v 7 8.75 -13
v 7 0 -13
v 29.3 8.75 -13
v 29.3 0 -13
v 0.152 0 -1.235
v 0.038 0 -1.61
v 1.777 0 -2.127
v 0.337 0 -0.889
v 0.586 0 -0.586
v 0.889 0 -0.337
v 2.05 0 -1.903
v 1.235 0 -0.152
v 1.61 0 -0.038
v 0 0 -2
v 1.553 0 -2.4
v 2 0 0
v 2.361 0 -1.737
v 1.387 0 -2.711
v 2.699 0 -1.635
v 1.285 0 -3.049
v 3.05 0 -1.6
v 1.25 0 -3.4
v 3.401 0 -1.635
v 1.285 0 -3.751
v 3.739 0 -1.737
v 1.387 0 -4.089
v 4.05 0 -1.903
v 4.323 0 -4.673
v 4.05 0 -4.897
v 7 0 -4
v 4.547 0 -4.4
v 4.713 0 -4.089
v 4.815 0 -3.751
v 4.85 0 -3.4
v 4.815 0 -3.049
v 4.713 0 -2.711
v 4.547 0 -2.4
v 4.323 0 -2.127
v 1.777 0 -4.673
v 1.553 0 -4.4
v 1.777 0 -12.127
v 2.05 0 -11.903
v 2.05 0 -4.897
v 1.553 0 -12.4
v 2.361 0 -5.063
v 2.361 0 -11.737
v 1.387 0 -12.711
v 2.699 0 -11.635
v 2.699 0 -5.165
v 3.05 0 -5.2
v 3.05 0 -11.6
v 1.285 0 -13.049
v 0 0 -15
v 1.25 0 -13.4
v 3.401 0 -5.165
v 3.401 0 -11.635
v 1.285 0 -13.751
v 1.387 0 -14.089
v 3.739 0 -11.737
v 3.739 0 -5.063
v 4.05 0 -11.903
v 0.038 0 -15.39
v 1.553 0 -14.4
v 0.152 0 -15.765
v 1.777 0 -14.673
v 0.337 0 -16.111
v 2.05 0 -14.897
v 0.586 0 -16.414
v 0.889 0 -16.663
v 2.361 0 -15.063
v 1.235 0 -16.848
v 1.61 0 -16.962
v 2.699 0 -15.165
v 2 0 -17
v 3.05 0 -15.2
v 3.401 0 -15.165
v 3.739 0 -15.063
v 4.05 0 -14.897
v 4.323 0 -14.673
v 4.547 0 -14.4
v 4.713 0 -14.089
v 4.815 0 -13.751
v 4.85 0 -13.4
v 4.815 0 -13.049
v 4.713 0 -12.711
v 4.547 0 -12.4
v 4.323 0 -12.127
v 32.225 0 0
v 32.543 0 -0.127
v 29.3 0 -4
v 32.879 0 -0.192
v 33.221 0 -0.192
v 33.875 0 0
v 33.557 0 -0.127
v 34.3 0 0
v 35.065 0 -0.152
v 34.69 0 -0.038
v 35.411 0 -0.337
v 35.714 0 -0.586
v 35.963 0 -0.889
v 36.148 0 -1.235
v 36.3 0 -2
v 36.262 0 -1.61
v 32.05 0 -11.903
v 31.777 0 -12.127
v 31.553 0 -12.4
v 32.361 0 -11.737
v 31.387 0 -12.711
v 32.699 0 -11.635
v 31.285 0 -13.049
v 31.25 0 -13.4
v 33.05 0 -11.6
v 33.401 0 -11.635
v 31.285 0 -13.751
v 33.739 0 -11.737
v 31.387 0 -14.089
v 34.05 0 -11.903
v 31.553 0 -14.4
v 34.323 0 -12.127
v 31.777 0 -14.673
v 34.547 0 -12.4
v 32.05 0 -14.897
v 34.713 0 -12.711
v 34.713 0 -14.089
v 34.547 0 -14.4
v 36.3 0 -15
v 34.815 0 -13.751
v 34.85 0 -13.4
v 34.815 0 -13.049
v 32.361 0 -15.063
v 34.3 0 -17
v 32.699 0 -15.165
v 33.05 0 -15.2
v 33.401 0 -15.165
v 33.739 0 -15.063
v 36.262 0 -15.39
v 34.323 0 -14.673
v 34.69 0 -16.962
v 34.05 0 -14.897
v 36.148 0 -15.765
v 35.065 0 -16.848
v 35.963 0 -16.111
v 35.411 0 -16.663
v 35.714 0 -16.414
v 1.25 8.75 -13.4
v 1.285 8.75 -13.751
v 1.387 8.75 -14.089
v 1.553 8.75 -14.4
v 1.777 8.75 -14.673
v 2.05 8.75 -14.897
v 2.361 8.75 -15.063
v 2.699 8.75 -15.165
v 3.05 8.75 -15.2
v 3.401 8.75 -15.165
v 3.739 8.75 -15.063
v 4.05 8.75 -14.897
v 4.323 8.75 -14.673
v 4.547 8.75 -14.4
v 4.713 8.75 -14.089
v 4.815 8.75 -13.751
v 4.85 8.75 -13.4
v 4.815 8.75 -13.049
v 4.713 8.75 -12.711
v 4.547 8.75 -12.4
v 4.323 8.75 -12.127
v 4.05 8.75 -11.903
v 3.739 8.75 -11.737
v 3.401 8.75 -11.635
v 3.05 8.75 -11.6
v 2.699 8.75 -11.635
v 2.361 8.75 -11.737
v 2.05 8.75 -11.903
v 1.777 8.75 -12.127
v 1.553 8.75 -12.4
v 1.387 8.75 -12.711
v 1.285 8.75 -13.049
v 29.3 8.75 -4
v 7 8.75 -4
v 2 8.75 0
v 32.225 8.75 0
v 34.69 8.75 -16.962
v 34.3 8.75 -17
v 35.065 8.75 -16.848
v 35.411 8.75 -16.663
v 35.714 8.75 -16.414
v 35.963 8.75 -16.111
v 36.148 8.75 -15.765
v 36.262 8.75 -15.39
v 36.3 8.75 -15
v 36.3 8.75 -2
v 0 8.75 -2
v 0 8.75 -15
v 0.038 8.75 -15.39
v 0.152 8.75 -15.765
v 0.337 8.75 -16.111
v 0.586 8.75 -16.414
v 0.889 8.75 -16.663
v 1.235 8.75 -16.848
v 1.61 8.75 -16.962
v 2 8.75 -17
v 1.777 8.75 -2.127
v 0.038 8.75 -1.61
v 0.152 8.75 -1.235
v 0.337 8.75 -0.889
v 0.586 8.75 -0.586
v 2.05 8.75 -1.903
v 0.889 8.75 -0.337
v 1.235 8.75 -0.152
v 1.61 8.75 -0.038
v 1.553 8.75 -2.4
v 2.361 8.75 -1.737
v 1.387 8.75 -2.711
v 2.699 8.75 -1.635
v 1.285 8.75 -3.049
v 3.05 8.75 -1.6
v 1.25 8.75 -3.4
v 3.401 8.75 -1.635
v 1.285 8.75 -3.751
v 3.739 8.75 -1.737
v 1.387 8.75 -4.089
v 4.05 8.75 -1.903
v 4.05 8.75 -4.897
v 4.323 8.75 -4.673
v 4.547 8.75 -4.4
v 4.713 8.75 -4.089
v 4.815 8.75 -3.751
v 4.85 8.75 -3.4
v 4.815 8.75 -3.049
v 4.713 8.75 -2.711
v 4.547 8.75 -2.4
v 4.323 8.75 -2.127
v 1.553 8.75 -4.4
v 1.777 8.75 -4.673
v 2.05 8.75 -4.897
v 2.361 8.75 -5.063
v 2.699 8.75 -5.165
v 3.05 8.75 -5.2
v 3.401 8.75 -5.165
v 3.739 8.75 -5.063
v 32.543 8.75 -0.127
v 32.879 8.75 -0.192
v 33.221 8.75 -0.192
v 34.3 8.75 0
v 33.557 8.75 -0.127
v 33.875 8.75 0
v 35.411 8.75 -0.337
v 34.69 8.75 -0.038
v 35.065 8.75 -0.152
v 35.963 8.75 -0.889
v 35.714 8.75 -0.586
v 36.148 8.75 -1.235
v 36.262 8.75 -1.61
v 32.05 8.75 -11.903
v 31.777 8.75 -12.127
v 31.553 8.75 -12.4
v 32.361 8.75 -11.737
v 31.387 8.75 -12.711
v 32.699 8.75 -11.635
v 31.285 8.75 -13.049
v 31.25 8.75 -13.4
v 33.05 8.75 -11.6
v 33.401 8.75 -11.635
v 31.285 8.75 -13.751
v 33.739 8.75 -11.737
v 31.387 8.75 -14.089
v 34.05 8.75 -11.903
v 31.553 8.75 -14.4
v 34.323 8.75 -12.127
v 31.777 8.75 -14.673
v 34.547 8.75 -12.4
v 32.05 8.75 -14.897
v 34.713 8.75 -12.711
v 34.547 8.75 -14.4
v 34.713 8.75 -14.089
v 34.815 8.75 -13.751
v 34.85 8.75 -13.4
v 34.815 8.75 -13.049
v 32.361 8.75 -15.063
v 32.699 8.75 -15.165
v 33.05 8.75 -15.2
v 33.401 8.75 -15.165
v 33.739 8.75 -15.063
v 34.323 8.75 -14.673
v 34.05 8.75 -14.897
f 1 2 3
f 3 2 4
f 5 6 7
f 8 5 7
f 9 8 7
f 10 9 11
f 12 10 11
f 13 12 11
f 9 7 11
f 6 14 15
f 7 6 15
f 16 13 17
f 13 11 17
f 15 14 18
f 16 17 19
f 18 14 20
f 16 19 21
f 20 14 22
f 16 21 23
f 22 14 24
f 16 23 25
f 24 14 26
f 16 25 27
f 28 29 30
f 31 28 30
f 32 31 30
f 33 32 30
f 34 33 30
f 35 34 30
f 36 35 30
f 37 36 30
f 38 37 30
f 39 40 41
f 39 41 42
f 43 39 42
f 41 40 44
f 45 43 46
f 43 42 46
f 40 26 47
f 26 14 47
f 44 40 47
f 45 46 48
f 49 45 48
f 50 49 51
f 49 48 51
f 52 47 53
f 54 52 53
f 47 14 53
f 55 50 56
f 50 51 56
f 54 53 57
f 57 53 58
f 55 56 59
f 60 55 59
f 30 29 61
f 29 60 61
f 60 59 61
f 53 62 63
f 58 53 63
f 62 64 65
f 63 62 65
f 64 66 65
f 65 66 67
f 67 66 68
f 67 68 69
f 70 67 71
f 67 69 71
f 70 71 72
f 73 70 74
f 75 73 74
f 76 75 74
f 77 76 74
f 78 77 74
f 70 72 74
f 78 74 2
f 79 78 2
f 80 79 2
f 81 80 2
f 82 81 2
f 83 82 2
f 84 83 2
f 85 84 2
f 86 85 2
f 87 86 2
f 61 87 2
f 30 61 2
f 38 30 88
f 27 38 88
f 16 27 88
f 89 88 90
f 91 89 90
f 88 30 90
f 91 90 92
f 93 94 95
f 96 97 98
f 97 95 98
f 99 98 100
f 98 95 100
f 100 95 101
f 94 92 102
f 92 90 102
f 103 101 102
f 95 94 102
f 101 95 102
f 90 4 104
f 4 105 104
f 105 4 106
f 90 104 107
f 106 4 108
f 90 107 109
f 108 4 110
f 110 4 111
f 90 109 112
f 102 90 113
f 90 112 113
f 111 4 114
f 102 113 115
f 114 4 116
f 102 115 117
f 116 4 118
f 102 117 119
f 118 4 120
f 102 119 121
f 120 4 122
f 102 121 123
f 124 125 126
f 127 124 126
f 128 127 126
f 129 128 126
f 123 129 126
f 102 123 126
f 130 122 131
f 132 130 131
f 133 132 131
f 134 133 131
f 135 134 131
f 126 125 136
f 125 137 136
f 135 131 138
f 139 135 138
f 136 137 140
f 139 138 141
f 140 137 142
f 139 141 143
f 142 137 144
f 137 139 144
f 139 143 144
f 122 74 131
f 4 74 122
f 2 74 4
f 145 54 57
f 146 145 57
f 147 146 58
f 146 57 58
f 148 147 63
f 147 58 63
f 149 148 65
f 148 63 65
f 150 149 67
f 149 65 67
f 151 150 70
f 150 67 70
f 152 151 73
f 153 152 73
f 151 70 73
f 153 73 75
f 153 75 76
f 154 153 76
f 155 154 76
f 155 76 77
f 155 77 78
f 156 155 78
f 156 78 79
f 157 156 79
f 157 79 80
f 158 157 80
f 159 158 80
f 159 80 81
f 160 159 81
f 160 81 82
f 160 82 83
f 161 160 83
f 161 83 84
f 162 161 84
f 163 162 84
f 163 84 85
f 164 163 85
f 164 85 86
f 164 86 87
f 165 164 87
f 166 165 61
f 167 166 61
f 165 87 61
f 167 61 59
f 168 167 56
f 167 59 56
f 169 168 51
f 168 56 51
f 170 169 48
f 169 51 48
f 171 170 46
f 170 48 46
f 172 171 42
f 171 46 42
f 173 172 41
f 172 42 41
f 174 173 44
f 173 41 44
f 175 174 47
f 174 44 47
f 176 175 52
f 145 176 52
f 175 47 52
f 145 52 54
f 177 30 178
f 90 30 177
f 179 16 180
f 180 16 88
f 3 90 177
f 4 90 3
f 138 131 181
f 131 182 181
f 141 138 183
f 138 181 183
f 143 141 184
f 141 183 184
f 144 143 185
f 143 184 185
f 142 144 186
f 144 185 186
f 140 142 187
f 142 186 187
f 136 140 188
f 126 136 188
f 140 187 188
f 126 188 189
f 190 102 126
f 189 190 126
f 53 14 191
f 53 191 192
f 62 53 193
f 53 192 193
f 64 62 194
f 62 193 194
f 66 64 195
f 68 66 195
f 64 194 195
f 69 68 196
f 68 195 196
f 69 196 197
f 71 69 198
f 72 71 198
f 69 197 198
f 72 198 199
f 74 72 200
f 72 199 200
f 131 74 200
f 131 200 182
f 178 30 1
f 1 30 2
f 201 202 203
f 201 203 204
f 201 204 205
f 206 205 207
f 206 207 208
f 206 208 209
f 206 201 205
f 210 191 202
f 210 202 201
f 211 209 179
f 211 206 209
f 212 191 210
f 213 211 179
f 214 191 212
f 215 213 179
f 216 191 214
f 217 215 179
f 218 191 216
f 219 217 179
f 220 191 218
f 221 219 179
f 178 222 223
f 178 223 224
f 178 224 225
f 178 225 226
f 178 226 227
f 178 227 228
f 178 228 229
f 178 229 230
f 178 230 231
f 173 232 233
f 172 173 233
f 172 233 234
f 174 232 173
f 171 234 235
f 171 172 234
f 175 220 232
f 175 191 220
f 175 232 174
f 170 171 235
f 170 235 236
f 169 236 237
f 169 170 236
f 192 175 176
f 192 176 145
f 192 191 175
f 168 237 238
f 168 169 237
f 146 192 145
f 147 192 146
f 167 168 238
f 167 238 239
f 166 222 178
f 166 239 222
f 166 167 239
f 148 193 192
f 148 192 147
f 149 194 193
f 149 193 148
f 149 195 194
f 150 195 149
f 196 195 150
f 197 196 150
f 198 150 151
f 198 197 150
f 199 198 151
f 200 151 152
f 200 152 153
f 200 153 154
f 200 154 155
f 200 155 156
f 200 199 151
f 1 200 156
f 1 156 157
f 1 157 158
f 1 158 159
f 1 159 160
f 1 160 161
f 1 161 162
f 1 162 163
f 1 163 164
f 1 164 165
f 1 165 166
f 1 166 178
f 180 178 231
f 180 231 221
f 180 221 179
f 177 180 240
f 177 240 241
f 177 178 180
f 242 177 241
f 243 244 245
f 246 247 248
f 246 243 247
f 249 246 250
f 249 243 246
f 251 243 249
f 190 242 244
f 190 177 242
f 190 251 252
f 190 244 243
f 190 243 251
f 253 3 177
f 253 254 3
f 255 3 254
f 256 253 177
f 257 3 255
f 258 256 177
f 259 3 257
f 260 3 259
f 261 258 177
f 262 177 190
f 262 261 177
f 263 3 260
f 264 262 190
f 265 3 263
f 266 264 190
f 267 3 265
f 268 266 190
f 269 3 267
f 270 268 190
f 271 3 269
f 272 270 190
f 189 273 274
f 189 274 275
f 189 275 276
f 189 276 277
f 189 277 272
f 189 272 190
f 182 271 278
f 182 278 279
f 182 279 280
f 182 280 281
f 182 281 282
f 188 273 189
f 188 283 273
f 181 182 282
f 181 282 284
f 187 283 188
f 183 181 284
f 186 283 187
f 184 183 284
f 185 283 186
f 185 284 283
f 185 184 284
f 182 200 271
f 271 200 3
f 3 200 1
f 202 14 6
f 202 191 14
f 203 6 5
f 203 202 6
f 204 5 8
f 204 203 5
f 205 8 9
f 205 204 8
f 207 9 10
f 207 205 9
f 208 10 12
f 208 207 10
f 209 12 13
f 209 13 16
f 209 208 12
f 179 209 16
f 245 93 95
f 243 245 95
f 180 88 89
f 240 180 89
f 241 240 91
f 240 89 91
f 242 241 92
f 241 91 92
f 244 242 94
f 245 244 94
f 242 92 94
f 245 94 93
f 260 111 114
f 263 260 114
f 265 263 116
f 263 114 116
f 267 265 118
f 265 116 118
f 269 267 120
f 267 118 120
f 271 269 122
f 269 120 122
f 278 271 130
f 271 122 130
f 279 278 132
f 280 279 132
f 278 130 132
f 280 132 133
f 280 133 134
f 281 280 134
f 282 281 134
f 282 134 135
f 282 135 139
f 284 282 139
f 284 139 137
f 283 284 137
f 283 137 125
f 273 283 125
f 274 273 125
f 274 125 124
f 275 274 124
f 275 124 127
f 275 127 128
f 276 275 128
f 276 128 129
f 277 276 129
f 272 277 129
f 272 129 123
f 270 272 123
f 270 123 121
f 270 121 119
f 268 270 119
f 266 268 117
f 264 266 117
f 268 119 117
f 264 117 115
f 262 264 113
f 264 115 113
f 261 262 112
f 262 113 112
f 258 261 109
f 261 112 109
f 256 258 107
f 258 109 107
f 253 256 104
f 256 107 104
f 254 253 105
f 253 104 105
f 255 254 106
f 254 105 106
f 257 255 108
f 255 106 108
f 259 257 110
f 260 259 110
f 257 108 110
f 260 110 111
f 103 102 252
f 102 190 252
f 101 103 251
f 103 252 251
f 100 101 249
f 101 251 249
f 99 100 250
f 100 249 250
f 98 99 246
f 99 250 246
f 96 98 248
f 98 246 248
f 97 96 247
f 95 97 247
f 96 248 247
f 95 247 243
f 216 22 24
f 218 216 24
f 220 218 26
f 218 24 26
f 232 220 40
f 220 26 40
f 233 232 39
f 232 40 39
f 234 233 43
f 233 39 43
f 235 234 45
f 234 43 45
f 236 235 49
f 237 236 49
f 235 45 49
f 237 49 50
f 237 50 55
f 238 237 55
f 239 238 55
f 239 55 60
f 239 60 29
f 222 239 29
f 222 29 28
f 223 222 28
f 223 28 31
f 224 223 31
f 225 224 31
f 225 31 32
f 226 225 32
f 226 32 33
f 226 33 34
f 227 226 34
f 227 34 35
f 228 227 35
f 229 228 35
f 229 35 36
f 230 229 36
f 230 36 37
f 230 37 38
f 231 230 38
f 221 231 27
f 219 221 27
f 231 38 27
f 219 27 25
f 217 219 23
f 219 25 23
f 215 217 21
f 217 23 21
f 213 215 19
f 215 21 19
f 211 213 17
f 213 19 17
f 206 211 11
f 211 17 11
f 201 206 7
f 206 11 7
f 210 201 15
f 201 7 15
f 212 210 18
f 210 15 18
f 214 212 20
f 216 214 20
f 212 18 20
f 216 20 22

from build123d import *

# Parameters (mm, degrees)
SKETCH1_W            = 36.3
SKETCH1_H            = 17
SKETCH1_W_2          = 22.3
SKETCH1_H_2          = 9
BOSS_EXTRUDE1_DEPTH  = 8.75
M3_CLEARANCE_HOLE1_D = 3.6
FILLET1_R            = 2


with BuildPart() as part:
    # Sketch1 → Boss-Extrude1 (new body)
    with BuildSketch(Plane(origin=(0, 0, 0), x_dir=(1, 0, 0), z_dir=(0, 1, 0))):
        with Locations((18.15, 8.5)):
            Rectangle(SKETCH1_W, SKETCH1_H)
        with Locations((18.15, 8.5)):
            Rectangle(SKETCH1_W_2, SKETCH1_H_2, mode=Mode.SUBTRACT)
    extrude(amount=BOSS_EXTRUDE1_DEPTH)

    # M3 Clearance Hole1 (through all)
    with Locations(Plane(origin=(0, 8.75, 0), x_dir=(1, 0, 0), z_dir=(0, 1, 0))):
        with Locations((3.050005, 3.4), (33.050005, -1.6), (33.050005, 13.4), (3.050005, 13.4)):
            Hole(M3_CLEARANCE_HOLE1_D / 2)

    # Fillet1
    fillet1_edges = [part.edges().sort_by_distance(p)[0] for p in [
        (0, 4.375, -17),
        (36.3, 4.375, -17),
        (36.3, 4.375, 0),
        (0, 4.375, 0),
    ]]
    fillet(fillet1_edges, radius=FILLET1_R)


solid = part.part
